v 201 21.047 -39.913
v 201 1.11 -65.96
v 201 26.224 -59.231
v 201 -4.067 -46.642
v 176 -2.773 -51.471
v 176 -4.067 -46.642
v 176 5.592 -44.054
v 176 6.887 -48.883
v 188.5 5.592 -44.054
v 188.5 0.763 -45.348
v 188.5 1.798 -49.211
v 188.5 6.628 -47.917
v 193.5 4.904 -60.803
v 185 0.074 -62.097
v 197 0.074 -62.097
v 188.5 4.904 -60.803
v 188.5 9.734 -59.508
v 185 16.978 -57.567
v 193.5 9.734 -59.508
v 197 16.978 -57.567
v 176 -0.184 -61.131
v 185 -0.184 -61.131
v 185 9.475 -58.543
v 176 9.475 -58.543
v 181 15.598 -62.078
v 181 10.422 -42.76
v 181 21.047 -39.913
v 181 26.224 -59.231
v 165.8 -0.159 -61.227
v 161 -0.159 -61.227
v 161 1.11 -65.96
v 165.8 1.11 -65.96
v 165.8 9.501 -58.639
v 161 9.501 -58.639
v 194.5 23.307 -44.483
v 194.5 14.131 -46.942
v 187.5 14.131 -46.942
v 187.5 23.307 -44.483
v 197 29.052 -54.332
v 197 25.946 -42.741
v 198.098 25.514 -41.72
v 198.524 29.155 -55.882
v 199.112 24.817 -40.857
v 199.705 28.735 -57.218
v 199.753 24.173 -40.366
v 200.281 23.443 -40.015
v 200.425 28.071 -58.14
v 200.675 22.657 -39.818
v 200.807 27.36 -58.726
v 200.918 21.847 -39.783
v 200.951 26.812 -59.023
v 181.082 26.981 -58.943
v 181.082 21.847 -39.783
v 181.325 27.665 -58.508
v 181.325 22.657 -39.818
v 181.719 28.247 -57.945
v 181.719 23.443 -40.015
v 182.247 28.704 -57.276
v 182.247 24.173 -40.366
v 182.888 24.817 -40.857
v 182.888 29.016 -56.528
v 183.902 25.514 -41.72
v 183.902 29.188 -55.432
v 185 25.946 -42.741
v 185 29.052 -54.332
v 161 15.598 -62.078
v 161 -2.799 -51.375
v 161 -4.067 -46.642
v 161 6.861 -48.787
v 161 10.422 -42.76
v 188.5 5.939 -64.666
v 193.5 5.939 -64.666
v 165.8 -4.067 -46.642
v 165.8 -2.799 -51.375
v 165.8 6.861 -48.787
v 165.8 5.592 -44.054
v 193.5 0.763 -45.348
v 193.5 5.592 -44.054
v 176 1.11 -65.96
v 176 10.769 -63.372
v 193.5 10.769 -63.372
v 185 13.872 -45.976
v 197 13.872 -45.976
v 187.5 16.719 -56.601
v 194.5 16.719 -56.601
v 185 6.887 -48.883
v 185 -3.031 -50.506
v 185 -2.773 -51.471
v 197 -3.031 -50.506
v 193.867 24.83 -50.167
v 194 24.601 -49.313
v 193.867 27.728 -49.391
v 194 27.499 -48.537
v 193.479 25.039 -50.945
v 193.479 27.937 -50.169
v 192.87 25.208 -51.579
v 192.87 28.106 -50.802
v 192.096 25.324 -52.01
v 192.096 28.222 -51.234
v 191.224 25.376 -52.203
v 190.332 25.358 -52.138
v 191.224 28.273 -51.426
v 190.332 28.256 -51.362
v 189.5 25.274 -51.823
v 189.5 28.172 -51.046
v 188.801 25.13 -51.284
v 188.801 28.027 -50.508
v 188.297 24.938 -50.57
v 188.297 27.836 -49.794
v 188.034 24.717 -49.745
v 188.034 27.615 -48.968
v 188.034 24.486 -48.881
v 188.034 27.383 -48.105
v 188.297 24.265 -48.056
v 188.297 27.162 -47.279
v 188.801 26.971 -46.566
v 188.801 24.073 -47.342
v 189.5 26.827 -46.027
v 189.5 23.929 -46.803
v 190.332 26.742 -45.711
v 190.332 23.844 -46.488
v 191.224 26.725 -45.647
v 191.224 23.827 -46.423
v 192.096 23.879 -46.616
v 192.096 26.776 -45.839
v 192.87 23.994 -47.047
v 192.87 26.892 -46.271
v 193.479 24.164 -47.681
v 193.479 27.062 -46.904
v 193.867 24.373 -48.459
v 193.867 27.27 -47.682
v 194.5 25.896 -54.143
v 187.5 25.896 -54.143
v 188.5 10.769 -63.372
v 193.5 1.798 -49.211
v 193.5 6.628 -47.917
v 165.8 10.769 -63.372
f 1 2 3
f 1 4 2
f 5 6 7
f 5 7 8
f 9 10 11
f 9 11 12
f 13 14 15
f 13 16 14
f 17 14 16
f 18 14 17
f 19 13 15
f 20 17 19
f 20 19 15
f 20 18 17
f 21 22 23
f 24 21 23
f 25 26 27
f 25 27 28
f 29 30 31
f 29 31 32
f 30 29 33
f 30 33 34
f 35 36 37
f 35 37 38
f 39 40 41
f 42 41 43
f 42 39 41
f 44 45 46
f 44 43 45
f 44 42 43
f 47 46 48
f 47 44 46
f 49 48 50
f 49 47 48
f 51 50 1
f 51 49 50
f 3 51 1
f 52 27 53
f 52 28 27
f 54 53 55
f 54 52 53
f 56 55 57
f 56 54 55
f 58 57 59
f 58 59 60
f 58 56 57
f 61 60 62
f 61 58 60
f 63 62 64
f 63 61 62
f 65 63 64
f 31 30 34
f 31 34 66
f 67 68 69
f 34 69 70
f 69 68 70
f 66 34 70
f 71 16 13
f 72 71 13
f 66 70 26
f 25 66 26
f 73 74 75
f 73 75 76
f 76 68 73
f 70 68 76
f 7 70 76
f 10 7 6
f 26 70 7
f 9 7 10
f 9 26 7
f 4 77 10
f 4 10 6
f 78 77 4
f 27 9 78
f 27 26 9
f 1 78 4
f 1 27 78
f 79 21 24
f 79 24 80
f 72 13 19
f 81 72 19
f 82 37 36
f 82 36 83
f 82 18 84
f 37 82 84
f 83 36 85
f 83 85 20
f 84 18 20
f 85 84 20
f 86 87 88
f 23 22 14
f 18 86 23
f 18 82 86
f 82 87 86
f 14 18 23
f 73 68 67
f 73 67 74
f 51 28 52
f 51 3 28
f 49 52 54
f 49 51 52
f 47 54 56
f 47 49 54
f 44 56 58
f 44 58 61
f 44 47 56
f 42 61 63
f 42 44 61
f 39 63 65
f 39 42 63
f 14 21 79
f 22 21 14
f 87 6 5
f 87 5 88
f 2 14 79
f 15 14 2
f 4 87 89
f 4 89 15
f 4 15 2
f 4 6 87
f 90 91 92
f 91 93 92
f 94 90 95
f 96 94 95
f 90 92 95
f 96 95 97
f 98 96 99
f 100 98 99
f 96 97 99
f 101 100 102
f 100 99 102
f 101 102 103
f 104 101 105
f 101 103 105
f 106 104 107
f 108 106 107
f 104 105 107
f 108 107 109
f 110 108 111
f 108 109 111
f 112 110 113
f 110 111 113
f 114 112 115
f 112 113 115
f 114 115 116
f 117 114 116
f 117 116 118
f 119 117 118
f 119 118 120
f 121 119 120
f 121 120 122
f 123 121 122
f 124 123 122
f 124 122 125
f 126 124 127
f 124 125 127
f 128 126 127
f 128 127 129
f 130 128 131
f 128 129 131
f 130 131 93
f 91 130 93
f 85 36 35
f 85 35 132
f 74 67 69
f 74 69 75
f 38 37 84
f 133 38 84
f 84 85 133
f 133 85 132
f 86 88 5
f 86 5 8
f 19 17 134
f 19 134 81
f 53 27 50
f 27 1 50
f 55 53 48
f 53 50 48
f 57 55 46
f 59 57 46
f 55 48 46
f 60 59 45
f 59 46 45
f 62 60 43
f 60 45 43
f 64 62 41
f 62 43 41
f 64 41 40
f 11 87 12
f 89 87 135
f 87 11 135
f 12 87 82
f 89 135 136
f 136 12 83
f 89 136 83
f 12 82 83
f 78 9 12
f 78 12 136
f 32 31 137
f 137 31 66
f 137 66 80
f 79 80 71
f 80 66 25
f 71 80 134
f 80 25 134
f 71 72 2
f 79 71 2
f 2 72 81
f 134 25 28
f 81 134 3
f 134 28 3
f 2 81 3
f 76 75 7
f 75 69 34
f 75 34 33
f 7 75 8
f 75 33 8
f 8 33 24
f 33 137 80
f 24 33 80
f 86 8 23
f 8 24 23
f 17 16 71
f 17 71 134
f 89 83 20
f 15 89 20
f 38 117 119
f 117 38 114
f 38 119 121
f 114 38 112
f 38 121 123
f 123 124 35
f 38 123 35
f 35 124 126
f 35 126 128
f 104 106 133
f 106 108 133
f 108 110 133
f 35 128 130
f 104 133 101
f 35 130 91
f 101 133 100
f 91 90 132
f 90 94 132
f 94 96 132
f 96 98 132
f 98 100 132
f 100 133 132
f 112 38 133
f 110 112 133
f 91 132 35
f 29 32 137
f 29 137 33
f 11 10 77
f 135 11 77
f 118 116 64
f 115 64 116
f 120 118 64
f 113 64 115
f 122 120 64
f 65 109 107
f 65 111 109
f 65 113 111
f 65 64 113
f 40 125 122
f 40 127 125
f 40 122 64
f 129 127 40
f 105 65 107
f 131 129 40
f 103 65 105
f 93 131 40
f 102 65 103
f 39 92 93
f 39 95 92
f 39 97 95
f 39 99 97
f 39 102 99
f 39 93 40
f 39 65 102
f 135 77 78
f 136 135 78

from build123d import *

# Parameters (mm, degrees)
SKETCH053_W             = 40
SKETCH053_H             = 15
PAD031_DEPTH            = 10
POCKET022_DEPTH         = 10
SKETCH051_W             = 20
SKETCH051_H             = 20
PAD030_DEPTH            = 30
SKETCH058_R             = 3
POCKET023_DEPTH         = 250
SKETCH052_W             = 7
SKETCH052_H             = 10
POCKET024_DEPTH         = 27
SKETCH055_W             = 10
SKETCH055_H             = 10
POCKET021_DEPTH         = 20
FILLET004_R             = 4
SKETCH057_W             = 5
SKETCH057_H             = 5
POCKET025_DEPTH         = 25
SKETCH008_W             = 12
SKETCH008_H             = 12
POCKET005_DEPTH         = 17.5
BODY016_PLACEMENT_ANGLE = 285


with BuildPart() as part:
    # Sketch053 → Pad031 (new body, symmetric)
    with BuildSketch(Plane.XZ):
        with Locations((-10, 7.5)):
            Rectangle(SKETCH053_W, SKETCH053_H)
    extrude(amount=PAD031_DEPTH, both=True)

    # Sketch056 → Pocket022 (cut)
    with BuildSketch(Plane.XY):
        Polygon((-25.2, 5.1), (-30.2, 5.1), (-30.2, -5.1), (-25.2, -5.1), (-25.2, -10), (-15, -10), (-15, 10), (-25.2, 10), align=None)
    extrude(amount=POCKET022_DEPTH, mode=Mode.SUBTRACT)

    # Sketch051 → Pad030 (join)
    with BuildSketch(Plane.XY):
        Rectangle(SKETCH051_W, SKETCH051_H)
    extrude(amount=PAD030_DEPTH)

    # Sketch058 → Pocket023 (cut, symmetric)
    with BuildSketch(Plane.XY):
        Circle(SKETCH058_R)
    extrude(amount=POCKET023_DEPTH, both=True, mode=Mode.SUBTRACT)

    # Sketch052 → Pocket024 (cut)
    with BuildSketch(Plane.XY):
        Rectangle(SKETCH052_W, SKETCH052_H)
    extrude(amount=POCKET024_DEPTH, mode=Mode.SUBTRACT)

    # Sketch055 → Pocket021 (cut)
    with BuildSketch(Plane.YZ):
        with Locations((0, 5)):
            Rectangle(SKETCH055_W, SKETCH055_H)
    extrude(amount=-POCKET021_DEPTH, mode=Mode.SUBTRACT)

    # Fillet004
    fillet004_edges = [part.edges().sort_by_distance(p)[0] for p in [
        (0, -10, 30),
        (10, 0, 30),
        (-10, 0, 30),
        (0, 10, 30),
    ]]
    fillet(fillet004_edges, radius=FILLET004_R)

    # Sketch057 → Pocket025 (cut, symmetric)
    with BuildSketch(Plane.XZ):
        with Locations((0, 7.5)):
            Rectangle(SKETCH057_W, SKETCH057_H)
    extrude(amount=POCKET025_DEPTH, both=True, mode=Mode.SUBTRACT)

    # Sketch008 → Pocket005 (cut, symmetric)
    with BuildSketch(Plane.XY):
        Rectangle(SKETCH008_W, SKETCH008_H)
    extrude(amount=POCKET005_DEPTH, both=True, mode=Mode.SUBTRACT)


with BuildPart() as part_1:
    # Body016 placement: moved
    add(part.part.moved(Location((191, -1.478585, -56.301099))).rotate(Axis((191, -1.478585, -56.301099), (1, 0, 0)), BODY016_PLACEMENT_ANGLE))


solid = part_1.part
